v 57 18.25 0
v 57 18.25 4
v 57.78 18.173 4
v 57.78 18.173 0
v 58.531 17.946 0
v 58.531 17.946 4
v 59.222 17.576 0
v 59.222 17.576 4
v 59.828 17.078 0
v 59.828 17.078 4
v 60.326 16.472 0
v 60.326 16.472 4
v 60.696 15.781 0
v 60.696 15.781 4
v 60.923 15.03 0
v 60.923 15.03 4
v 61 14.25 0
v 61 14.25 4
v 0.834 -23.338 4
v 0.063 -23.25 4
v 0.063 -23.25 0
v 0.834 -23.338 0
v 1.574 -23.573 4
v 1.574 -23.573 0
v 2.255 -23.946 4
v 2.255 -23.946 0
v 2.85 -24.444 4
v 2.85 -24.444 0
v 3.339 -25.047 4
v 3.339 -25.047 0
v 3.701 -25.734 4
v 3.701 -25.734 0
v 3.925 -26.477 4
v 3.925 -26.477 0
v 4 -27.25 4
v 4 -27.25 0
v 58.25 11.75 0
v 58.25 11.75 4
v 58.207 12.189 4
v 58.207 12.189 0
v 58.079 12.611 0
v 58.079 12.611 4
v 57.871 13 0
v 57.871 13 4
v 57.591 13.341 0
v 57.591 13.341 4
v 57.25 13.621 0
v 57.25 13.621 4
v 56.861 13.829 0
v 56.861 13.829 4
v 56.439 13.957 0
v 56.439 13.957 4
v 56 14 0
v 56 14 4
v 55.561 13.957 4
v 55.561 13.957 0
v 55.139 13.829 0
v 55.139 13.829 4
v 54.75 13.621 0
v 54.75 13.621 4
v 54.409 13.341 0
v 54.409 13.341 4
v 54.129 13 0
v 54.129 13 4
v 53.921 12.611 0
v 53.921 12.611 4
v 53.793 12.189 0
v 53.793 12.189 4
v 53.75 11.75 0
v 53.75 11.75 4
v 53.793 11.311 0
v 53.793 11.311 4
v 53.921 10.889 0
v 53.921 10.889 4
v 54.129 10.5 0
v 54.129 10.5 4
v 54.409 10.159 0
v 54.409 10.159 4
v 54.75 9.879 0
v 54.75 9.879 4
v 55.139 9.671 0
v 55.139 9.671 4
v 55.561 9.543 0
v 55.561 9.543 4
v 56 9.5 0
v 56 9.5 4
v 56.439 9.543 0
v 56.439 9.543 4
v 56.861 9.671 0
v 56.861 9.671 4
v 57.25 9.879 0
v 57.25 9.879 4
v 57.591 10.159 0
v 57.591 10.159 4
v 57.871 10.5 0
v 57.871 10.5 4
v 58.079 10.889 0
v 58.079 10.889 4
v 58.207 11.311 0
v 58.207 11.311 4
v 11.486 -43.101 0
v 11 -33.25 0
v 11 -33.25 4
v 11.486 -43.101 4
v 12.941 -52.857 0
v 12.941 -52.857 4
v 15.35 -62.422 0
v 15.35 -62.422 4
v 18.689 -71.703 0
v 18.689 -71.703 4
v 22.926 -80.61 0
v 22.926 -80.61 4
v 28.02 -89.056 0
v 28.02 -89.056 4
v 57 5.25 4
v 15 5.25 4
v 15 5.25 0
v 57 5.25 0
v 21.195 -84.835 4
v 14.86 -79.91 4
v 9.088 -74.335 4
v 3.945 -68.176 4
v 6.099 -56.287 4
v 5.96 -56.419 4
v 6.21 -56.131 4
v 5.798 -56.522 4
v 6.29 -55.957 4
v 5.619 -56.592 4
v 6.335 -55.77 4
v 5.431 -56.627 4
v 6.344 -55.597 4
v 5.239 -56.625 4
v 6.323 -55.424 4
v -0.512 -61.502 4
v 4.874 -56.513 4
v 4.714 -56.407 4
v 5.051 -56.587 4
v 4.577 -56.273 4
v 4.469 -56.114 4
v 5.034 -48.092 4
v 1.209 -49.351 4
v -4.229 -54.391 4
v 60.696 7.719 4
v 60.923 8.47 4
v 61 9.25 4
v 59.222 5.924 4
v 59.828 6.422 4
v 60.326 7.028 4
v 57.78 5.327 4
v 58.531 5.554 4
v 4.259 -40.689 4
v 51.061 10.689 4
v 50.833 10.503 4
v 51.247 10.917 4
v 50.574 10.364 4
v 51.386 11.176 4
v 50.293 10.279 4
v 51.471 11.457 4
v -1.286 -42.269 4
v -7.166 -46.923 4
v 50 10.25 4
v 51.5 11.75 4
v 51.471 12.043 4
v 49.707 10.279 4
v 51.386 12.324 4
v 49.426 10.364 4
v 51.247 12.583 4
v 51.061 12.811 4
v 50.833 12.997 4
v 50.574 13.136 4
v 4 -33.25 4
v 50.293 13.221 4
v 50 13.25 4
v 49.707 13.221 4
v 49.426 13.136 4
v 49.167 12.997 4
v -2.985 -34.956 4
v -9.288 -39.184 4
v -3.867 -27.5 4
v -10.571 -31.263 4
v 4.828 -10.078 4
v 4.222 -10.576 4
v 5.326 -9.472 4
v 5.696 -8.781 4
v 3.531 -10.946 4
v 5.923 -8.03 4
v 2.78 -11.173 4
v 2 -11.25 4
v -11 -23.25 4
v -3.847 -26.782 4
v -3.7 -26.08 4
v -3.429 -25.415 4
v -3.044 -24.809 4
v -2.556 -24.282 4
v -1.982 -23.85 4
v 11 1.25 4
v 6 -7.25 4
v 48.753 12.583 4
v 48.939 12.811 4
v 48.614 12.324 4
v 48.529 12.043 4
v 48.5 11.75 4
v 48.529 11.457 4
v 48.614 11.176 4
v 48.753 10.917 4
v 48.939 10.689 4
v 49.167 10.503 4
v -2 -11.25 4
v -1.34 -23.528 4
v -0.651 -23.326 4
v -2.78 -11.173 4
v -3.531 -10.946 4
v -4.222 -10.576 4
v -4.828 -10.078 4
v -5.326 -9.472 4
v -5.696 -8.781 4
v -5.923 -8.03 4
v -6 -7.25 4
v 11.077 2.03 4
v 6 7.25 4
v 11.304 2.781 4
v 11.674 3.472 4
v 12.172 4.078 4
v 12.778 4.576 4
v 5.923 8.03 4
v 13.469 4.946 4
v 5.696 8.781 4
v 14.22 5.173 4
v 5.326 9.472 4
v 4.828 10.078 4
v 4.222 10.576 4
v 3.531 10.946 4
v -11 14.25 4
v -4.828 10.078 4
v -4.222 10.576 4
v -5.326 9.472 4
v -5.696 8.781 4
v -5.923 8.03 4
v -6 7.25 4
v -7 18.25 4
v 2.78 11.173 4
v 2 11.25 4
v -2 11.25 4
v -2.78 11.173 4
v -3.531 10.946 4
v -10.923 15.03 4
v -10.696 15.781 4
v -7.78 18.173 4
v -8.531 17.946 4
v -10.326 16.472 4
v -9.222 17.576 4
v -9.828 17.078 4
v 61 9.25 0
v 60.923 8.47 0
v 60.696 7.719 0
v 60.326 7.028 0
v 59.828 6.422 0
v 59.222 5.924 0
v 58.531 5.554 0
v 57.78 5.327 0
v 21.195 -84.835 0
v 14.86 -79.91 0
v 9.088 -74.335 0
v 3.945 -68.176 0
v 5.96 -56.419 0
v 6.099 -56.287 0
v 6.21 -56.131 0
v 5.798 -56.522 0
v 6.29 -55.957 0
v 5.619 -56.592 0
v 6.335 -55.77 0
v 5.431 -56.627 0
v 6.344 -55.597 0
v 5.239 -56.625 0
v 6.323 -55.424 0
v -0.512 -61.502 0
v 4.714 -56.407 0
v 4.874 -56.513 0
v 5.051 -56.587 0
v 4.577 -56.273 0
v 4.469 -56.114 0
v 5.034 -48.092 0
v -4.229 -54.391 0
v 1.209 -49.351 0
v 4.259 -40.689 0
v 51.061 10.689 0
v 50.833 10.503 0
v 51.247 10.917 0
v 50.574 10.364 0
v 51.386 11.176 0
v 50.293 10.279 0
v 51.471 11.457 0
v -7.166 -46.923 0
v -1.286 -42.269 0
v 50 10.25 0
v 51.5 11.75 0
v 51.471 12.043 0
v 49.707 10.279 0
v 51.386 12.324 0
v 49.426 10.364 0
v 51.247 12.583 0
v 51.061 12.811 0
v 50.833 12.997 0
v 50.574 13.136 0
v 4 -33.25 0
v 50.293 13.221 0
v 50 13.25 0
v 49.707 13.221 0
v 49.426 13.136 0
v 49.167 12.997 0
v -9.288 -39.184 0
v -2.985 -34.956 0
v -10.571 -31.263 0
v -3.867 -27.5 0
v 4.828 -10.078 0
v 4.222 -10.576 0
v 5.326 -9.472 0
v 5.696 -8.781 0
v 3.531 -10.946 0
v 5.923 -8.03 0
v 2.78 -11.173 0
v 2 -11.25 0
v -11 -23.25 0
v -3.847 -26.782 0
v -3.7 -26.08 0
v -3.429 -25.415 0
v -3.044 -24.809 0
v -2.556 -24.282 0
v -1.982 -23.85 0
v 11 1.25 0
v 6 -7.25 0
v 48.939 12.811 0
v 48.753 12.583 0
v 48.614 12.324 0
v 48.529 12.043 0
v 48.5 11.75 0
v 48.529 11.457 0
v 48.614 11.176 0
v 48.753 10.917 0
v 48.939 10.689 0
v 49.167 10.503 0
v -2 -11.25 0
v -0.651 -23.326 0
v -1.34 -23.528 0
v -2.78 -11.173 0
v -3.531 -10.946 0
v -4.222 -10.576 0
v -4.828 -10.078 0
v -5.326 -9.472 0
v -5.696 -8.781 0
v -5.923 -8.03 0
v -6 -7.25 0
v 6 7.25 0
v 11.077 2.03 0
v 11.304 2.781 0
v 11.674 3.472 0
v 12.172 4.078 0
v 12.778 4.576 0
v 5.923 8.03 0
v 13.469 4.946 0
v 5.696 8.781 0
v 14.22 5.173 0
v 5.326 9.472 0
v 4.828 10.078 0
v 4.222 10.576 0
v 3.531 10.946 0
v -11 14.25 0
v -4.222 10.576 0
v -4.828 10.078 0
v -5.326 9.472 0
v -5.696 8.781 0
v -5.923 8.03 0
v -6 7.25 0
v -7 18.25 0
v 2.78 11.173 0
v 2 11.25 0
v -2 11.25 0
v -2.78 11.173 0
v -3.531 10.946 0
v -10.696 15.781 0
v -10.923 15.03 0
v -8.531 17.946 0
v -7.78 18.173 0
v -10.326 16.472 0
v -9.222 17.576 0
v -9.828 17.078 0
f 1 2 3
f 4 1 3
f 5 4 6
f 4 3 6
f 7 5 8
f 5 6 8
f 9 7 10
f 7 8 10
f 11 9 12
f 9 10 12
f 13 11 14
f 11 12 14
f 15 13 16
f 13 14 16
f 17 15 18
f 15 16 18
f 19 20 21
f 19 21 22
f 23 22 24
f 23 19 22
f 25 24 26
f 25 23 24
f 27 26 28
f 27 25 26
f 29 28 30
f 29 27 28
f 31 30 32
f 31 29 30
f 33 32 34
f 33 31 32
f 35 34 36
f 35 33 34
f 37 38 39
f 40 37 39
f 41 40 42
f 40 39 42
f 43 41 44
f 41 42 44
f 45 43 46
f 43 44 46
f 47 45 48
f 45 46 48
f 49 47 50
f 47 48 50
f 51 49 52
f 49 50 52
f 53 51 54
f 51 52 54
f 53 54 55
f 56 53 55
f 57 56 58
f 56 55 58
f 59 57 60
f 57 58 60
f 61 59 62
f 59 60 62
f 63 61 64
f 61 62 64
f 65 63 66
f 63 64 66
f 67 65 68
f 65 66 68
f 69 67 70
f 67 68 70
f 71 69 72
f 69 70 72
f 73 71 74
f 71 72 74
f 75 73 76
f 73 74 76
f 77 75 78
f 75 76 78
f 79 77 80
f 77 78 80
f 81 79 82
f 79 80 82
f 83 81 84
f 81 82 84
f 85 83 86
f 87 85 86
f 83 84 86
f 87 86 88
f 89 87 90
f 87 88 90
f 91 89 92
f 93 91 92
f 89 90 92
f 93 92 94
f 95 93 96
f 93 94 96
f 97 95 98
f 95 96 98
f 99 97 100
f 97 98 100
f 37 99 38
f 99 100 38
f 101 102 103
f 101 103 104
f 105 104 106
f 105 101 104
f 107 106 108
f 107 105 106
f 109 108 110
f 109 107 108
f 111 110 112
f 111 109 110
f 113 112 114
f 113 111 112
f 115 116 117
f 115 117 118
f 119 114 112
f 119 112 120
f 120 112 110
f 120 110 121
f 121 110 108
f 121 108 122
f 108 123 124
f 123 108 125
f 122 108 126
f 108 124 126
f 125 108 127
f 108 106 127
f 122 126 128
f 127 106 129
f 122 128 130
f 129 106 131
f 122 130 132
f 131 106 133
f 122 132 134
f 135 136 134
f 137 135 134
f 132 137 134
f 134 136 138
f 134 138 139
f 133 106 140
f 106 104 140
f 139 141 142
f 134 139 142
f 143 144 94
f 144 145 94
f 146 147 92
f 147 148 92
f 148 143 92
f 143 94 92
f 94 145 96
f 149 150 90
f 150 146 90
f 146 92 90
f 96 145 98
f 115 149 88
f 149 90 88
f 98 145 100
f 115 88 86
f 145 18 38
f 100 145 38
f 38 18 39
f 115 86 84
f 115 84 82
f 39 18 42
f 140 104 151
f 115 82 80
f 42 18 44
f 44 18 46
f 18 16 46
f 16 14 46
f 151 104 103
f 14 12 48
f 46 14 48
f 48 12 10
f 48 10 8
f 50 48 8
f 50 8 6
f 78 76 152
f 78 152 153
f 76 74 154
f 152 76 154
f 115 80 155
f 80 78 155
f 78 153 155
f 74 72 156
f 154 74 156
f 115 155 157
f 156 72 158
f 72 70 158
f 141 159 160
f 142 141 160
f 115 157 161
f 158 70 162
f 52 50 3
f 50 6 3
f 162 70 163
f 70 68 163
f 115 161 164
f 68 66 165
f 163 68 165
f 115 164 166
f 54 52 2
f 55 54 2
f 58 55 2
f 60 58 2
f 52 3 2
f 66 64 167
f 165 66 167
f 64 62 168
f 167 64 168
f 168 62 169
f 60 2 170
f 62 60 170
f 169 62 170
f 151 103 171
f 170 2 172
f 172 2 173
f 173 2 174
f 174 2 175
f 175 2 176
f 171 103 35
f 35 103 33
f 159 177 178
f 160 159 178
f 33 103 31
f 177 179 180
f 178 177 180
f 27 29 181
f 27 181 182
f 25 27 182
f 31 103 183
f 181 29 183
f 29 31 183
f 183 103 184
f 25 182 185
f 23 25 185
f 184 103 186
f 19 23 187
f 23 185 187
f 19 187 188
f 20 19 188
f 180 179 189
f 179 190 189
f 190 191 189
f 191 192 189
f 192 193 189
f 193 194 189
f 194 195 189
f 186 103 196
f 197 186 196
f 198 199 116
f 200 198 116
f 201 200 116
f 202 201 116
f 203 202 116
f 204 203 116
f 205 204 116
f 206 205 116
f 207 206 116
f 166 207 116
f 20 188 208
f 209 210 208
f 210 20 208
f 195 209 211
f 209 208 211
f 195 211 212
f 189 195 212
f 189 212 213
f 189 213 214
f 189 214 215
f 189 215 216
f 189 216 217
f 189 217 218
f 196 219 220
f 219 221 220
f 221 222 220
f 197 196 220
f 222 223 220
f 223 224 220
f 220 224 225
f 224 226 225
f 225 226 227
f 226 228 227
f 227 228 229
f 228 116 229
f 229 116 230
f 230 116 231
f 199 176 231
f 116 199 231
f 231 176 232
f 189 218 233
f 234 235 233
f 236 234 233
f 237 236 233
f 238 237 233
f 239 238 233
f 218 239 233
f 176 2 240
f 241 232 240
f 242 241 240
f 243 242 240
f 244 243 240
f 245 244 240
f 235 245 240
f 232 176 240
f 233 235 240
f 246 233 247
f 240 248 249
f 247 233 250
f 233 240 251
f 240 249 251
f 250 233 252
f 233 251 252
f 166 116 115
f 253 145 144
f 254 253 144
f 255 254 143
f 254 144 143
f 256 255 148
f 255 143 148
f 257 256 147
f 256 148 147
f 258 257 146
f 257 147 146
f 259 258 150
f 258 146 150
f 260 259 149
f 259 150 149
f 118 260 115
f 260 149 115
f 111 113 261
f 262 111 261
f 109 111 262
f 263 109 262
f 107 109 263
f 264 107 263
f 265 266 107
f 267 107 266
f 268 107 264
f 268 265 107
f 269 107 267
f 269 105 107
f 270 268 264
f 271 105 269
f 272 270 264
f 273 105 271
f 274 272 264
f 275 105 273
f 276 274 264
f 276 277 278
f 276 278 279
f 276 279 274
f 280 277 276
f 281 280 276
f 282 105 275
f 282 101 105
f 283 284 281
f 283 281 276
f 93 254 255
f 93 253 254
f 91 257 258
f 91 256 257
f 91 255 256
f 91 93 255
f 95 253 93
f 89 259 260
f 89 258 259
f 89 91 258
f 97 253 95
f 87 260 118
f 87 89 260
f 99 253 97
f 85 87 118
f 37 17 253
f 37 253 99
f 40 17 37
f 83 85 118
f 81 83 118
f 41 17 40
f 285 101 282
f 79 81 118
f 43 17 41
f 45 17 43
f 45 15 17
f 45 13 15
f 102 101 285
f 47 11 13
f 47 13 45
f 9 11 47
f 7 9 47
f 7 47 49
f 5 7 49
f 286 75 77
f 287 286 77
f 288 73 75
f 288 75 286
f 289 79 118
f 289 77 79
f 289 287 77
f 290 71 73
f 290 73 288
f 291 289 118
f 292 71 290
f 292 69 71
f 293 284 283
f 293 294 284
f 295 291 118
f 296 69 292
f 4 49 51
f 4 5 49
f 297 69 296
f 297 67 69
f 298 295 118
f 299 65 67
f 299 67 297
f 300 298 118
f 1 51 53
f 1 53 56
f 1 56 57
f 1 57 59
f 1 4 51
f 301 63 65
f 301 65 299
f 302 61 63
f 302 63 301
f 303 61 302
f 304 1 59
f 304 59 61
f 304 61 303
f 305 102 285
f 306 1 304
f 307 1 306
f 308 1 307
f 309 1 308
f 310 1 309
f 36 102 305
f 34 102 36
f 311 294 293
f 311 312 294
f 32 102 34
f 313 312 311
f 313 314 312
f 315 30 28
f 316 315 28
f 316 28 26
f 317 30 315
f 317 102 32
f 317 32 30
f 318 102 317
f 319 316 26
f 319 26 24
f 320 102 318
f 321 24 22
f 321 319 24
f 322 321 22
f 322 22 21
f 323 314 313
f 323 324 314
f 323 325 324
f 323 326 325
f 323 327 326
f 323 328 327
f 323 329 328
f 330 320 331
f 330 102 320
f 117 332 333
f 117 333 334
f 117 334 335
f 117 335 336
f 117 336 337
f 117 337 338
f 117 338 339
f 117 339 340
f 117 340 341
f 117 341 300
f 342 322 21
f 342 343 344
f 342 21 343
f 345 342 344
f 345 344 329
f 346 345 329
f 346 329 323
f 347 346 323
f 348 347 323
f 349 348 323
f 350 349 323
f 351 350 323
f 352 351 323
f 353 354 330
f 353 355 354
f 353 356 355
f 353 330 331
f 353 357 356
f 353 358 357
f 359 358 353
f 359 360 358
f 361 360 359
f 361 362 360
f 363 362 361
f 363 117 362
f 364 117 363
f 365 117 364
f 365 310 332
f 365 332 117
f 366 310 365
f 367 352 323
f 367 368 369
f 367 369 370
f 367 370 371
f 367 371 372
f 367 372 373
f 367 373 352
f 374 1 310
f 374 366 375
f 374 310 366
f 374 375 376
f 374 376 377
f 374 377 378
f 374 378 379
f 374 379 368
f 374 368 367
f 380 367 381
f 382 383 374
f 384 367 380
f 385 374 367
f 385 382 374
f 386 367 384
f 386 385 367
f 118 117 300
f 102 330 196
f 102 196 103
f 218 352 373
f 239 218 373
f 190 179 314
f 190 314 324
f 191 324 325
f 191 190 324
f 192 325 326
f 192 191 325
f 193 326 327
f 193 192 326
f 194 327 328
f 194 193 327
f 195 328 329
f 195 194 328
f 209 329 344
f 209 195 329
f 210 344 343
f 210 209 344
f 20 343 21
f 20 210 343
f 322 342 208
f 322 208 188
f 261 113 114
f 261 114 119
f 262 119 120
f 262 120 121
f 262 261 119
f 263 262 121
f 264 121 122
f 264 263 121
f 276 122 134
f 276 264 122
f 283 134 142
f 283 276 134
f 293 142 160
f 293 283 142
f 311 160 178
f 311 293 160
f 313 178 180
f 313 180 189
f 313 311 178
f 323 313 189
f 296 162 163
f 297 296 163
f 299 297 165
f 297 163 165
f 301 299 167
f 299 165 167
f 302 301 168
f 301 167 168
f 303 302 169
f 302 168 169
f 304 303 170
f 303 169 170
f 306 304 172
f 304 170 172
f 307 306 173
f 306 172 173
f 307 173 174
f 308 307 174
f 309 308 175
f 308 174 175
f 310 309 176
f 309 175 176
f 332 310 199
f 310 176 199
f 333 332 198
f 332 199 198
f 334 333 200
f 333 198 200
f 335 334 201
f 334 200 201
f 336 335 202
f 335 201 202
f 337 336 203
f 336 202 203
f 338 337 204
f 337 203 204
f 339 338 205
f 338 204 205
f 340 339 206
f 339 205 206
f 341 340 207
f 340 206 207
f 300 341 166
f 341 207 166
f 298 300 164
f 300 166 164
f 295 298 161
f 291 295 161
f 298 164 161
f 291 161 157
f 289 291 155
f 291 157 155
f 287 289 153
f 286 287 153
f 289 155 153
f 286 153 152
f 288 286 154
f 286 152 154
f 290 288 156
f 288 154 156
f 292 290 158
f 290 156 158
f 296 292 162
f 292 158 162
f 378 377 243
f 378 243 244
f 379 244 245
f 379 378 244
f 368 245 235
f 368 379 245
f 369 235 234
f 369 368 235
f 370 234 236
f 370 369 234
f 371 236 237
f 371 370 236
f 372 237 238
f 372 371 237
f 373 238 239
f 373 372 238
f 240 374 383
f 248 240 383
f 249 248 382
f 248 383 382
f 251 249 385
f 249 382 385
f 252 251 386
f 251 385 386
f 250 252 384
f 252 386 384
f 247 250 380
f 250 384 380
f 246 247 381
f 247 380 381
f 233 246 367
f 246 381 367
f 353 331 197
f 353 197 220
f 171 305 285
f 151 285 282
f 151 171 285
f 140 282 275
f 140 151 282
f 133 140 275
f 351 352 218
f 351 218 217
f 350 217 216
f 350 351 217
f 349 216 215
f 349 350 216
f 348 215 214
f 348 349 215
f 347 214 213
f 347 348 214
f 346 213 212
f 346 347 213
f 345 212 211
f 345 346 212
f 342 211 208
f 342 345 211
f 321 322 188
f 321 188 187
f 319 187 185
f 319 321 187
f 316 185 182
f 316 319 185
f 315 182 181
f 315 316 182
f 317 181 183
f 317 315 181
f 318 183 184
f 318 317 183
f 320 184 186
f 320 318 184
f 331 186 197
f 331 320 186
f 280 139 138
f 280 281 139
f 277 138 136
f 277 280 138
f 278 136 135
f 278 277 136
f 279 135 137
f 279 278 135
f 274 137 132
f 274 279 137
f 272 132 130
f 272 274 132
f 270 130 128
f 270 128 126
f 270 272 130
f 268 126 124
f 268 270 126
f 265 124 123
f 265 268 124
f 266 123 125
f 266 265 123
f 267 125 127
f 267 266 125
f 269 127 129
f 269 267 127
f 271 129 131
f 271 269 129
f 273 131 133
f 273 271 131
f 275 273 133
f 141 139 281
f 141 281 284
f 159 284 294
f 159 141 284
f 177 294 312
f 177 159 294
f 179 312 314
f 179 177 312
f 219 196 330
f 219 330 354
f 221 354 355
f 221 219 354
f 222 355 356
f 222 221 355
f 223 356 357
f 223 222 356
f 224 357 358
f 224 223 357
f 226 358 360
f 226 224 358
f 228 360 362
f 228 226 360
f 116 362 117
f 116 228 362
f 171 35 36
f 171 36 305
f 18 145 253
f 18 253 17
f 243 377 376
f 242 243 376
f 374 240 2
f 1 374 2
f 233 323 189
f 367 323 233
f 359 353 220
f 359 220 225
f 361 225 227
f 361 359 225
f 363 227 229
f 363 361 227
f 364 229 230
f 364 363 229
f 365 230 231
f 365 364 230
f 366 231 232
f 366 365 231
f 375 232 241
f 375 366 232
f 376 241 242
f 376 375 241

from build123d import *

# Parameters (mm, degrees)
ESQUISSE1_W             = 12
ESQUISSE1_H             = 22.5
BOSS_EXTRU_1_DEPTH      = 4
ENL_V_MAT_EXTRU_1_DEPTH = 94.445721179
SKETCH1_W               = 50
SKETCH1_H               = 13
BOSS_EXTRUDE1_DEPTH     = 4
SKETCH2_R               = 2.25
SKETCH2_R_2             = 1.5
CUT_EXTRUDE1_DEPTH      = 4
FILLET1_R               = 4
FILLET2_R               = 1


with BuildPart() as part:
    # Esquisse1 → Boss.-Extru.1 (new body)
    with BuildSketch(Plane.XY):
        with BuildLine():
            Line((-11, -18.25), (-11, 18.25))
            Line((-11, 18.25), (11, 18.25))
            Line((11, 18.25), (11, -18.25))
            Line((11, -18.25), (11, -33.25))
            ThreePointArc((11, -33.25), (15.349591107, -62.421891926), (28.019985571, -89.056067818))
            ThreePointArc((28.019985571, -89.056067818), (-0.511631053, -61.502443829), (-11, -23.25))
            Line((-11, -23.25), (-11, -18.25))
        make_face()
        Rectangle(ESQUISSE1_W, ESQUISSE1_H, mode=Mode.SUBTRACT)
    extrude(amount=BOSS_EXTRU_1_DEPTH)

    # Esquisse2 → Enlèv. mat.-Extru.1 (cut, through all)
    with BuildSketch(Plane.XY.offset(4)):
        with BuildLine():
            Line((-4, -23.25), (4, -23.25))
            Line((4, -23.25), (4, -33.25))
            ThreePointArc((4, -33.25), (4.956601419, -47.525770288), (7.809301258, -61.546284087))
            ThreePointArc((7.809301258, -61.546284087), (-0.980641404, -43.287870216), (-4, -23.25))
        make_face()
    extrude(amount=-ENL_V_MAT_EXTRU_1_DEPTH, mode=Mode.SUBTRACT)

    # Sketch1 → Boss-Extrude1 (add)
    with BuildSketch(Plane.XY.offset(4)):
        with Locations((36, 11.75)):
            Rectangle(SKETCH1_W, SKETCH1_H)
    extrude(amount=-BOSS_EXTRUDE1_DEPTH)

    # Sketch2 → Cut-Extrude1 (cut)
    with BuildSketch(Plane.XY.offset(4)):
        with Locations((56, 11.75)):
            Circle(SKETCH2_R)
        with Locations((50, 11.75)):
            Circle(SKETCH2_R_2)
    extrude(amount=-CUT_EXTRUDE1_DEPTH, mode=Mode.SUBTRACT)

    # Fillet1
    # the kernel refuses this fillet: 4 mm, written as the material it adds along each edge
    with BuildSketch(Plane(origin=(11, 5.25, 4), x_dir=(0, -1, 0), z_dir=(0, 0, -1)), Plane(origin=(4, -23.25, 4), x_dir=(-1, 0, 0), z_dir=(0, 0, -1)), Plane(origin=(6, -11.25, 0), x_dir=(-1, 0, 0), z_dir=(0, 0, 1)), Plane(origin=(6, 11.25, 0), x_dir=(0, -1, 0), z_dir=(0, 0, 1))) as fillet1_piece_1:
        with BuildLine():
            CenterArc((FILLET1_R, -FILLET1_R), FILLET1_R, 90, 90)
            Line((0, -FILLET1_R), (0, 0))
            Line((0, 0), (FILLET1_R, 0))
        make_face()
    extrude(amount=4)
    with BuildSketch(Plane(origin=(-4, -23.25, 4), x_dir=(1, 0, 0), z_dir=(0, 0, -1))) as fillet1_piece_2:
        with BuildLine():
            CenterArc((4.125122309, 4), FILLET1_R, 176.416678302, 93.583321698)
            ThreePointArc((0.132942454, 4.25), (0.033243739, 2.126039375), (0, 0))
            Line((0, 0), (4.125122309, 0))
        make_face()
    extrude(amount=4)
    with BuildSketch(Plane(origin=(-6, -11.25, 0), x_dir=(1, 0, 0), z_dir=(0, 0, 1)), Plane(origin=(-6, 11.25, 0), x_dir=(0, -1, 0), z_dir=(0, 0, 1))) as fillet1_piece_3:
        with BuildLine():
            CenterArc((FILLET1_R, FILLET1_R), FILLET1_R, 180, 90)
            Line((0, FILLET1_R), (0, 0))
            Line((0, 0), (FILLET1_R, 0))
        make_face()
    extrude(amount=4)
    # the kernel refuses this fillet: 4 mm, written as the material it takes off along each edge
    with BuildSketch(Plane(origin=(-11, 18.25, -10), x_dir=(0, -1, 0), z_dir=(0, 0, 1))) as fillet1_2_piece_1:
        with BuildLine():
            CenterArc((FILLET1_R, FILLET1_R), FILLET1_R, 180, 90)
            Line((0, FILLET1_R), (0, 0))
            Line((0, 0), (FILLET1_R, 0))
        make_face()
    extrude(amount=24, mode=Mode.SUBTRACT)
    with BuildSketch(Plane(origin=(61, 5.25, 14), x_dir=(0, 1, 0), z_dir=(0, 0, -1)), Plane(origin=(61, 18.25, 14), x_dir=(-1, 0, 0), z_dir=(0, 0, -1))) as fillet1_2_piece_2:
        with BuildLine():
            CenterArc((FILLET1_R, -FILLET1_R), FILLET1_R, 90, 90)
            Line((0, -FILLET1_R), (0, 0))
            Line((0, 0), (FILLET1_R, 0))
        make_face()
    extrude(amount=24, mode=Mode.SUBTRACT)

    # Fillet2
    fillet2_edges = [part.edges().sort_by_distance(p)[0] for p in [
        (7.809301258, -61.546284087, 2),
    ]]
    fillet(fillet2_edges, radius=FILLET2_R)


solid = part.part
